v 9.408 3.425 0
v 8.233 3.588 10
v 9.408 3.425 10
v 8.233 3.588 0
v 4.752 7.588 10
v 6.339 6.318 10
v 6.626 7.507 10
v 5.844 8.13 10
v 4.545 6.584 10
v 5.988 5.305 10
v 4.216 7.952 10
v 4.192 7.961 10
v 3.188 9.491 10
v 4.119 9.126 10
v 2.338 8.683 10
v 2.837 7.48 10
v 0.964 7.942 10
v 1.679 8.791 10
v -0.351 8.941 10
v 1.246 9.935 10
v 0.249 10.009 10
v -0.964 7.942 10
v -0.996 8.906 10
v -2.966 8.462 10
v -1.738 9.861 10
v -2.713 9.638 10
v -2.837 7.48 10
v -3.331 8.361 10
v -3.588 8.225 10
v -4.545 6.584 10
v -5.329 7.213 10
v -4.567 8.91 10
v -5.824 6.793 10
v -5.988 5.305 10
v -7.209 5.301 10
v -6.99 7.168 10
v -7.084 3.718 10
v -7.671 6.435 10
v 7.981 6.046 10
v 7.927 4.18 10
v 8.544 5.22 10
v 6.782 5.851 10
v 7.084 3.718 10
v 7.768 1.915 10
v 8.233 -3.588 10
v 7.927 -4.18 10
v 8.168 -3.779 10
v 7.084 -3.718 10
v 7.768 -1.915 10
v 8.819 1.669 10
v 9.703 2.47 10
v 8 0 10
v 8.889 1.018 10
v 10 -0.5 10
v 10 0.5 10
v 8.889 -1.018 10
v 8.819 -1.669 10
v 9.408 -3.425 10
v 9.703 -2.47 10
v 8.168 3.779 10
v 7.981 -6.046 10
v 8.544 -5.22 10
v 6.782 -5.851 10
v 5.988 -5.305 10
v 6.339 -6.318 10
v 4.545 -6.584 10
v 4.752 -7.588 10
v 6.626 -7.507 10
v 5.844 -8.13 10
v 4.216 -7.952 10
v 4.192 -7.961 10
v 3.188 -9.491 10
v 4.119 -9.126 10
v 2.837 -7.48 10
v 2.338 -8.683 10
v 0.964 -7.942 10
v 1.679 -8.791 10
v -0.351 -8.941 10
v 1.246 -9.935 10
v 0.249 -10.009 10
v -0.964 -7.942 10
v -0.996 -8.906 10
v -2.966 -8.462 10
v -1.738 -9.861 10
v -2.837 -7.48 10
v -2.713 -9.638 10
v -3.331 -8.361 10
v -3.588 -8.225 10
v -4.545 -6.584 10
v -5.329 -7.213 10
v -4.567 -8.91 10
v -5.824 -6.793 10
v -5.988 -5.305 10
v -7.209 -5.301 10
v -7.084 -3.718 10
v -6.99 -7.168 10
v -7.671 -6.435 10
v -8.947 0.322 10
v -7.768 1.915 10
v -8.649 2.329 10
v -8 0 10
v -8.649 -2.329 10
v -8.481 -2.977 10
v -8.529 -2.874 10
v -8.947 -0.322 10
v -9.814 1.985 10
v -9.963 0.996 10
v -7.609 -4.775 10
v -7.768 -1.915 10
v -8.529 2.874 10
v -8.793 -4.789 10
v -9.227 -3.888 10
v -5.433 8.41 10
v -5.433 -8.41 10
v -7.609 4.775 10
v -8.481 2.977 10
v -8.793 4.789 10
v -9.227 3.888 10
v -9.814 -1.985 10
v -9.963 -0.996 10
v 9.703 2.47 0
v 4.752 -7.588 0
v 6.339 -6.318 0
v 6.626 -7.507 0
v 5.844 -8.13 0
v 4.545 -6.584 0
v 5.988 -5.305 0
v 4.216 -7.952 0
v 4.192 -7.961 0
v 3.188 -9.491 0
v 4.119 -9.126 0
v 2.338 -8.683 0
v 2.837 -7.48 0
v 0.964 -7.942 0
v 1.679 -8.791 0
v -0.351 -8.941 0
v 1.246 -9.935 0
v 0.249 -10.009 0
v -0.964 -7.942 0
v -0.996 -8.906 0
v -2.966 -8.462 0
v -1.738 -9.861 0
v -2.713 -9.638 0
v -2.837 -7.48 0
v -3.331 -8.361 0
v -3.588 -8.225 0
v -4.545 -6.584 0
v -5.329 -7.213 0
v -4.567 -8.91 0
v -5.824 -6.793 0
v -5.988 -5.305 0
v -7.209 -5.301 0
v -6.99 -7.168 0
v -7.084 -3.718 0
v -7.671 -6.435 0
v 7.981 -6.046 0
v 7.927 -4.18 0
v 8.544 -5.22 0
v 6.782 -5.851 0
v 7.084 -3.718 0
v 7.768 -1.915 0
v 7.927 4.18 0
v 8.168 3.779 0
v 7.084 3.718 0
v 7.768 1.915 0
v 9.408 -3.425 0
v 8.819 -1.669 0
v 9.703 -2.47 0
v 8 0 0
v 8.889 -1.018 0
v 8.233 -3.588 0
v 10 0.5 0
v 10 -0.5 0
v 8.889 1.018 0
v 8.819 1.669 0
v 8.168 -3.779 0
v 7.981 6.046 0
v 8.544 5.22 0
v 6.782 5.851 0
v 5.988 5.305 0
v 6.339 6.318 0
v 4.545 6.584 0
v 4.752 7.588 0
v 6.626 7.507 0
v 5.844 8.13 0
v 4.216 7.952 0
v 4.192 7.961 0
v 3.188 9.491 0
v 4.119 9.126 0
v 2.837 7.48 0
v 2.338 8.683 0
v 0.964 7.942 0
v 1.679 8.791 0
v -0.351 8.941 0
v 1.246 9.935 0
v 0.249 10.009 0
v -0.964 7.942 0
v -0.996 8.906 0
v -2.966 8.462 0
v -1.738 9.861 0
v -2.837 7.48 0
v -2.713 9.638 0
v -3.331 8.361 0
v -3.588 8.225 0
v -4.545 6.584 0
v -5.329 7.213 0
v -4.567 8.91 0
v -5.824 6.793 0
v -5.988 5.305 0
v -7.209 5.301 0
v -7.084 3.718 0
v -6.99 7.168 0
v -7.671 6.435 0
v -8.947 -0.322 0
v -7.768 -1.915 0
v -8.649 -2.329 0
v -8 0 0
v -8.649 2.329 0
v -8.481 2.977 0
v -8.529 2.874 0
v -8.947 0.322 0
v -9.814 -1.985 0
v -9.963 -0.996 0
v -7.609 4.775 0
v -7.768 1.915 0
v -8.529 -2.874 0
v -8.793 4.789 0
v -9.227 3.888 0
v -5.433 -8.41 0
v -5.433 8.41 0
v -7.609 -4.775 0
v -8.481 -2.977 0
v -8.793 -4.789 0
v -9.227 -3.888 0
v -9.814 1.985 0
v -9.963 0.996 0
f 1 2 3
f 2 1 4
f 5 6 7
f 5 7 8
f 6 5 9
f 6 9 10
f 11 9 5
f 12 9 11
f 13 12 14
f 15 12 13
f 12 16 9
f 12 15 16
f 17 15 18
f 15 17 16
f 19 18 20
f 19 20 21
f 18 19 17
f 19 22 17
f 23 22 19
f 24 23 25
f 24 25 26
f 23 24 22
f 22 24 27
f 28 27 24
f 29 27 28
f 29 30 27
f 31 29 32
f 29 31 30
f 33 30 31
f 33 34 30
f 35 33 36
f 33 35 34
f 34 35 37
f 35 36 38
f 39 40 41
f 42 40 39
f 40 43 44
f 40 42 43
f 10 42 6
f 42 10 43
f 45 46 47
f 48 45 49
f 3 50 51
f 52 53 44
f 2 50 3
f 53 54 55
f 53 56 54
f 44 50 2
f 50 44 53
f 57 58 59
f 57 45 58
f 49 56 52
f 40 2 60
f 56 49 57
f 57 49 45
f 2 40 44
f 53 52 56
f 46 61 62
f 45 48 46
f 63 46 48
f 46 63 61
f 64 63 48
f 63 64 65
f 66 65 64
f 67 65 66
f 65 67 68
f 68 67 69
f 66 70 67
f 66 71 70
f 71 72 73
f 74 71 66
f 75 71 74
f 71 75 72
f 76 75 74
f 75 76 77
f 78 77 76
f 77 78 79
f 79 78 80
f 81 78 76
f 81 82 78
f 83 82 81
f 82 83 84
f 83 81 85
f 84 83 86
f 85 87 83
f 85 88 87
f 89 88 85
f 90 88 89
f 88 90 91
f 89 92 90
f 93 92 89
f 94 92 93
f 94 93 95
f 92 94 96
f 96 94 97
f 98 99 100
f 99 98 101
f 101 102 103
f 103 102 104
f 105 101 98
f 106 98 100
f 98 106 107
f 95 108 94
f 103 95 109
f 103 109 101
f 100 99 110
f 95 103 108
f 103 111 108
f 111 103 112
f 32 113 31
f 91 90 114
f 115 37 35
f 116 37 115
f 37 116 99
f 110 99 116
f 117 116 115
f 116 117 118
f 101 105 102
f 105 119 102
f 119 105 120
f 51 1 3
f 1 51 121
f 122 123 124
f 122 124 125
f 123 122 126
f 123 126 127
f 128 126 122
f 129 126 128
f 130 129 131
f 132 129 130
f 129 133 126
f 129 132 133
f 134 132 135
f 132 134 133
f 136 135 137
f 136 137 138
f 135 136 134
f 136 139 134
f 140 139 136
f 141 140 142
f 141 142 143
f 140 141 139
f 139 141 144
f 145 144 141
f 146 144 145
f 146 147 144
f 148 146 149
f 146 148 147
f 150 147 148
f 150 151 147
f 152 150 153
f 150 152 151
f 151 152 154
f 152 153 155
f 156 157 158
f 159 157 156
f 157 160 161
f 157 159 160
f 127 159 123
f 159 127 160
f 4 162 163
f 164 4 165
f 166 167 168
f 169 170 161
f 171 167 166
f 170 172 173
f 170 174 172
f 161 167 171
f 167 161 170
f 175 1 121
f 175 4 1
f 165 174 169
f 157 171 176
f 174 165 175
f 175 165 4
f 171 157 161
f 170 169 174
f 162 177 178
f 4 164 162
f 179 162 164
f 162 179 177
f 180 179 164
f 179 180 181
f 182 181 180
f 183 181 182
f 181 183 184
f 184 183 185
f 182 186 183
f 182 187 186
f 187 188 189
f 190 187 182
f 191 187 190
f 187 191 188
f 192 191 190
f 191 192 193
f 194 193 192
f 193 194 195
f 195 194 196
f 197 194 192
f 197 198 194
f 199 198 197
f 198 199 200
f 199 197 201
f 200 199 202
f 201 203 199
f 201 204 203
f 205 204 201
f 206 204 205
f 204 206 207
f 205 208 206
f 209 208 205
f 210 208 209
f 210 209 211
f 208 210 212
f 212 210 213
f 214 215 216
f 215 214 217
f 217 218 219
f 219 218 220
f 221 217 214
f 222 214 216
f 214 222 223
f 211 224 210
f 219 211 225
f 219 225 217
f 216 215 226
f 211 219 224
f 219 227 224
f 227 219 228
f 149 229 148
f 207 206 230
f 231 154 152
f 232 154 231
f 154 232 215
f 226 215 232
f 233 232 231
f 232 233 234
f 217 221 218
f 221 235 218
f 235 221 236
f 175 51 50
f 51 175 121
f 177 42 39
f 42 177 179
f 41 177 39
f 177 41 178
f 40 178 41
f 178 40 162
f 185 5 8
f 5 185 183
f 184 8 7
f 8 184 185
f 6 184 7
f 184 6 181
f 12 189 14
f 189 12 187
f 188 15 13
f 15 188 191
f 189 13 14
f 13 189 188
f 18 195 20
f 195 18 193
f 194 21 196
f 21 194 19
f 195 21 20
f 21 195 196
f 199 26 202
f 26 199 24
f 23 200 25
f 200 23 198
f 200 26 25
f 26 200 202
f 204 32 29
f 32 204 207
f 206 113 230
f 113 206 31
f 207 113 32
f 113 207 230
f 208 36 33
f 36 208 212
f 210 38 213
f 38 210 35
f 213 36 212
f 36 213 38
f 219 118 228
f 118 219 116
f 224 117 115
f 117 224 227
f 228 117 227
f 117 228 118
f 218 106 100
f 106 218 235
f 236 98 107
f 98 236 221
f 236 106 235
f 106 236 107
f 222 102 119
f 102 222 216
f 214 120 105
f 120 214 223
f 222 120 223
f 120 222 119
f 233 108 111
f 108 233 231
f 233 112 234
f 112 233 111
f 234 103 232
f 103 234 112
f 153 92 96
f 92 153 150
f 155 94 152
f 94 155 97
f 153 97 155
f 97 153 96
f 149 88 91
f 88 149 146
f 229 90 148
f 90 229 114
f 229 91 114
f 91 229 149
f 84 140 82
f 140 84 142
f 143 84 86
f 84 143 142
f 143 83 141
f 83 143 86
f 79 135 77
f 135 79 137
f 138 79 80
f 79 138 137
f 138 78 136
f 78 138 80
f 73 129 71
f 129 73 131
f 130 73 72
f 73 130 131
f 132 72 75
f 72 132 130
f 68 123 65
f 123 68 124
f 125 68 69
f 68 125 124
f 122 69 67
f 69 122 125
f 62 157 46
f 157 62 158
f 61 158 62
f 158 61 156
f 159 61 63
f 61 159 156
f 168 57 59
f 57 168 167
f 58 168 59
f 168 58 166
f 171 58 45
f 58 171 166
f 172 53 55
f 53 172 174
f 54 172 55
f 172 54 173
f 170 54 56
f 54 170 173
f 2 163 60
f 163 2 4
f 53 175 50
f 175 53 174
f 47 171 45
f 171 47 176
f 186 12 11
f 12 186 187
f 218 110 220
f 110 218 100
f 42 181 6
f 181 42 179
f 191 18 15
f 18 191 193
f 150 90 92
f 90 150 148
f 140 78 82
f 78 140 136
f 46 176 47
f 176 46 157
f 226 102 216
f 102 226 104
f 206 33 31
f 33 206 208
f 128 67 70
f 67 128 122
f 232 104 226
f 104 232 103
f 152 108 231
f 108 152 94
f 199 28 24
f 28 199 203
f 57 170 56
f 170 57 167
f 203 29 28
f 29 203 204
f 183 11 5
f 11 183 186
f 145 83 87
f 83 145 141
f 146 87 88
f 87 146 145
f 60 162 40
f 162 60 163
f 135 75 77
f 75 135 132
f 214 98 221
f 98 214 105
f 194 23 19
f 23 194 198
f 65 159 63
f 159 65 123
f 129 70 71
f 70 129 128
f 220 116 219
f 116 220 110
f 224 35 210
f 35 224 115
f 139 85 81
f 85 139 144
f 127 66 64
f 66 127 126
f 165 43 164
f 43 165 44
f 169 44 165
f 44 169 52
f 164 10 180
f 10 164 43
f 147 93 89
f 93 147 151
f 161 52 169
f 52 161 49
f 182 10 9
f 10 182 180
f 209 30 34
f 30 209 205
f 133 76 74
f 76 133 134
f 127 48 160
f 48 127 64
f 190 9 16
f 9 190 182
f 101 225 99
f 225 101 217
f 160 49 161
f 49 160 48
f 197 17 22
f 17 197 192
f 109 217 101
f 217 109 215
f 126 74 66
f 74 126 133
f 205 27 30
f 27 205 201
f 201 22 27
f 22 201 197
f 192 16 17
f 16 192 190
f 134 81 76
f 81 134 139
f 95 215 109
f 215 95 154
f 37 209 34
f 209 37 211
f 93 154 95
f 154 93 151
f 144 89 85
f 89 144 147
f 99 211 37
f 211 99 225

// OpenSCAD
tooth=21;  // tooth count
h=10;

difference() {
  union() {
    cylinder(h=h, d=18);    
    for (i = [1:tooth]) {
      rotate([0, 0, 360/tooth*i]) union() {
        translate([8.5, 0, 0]) linear_extrude(height=h)
          polygon([[0, -1.2], [1.5, -0.5], [1.5, 0.5], [0, 1.2]]);
      }
    }
  }
  cylinder(h=h, d=16);
}
